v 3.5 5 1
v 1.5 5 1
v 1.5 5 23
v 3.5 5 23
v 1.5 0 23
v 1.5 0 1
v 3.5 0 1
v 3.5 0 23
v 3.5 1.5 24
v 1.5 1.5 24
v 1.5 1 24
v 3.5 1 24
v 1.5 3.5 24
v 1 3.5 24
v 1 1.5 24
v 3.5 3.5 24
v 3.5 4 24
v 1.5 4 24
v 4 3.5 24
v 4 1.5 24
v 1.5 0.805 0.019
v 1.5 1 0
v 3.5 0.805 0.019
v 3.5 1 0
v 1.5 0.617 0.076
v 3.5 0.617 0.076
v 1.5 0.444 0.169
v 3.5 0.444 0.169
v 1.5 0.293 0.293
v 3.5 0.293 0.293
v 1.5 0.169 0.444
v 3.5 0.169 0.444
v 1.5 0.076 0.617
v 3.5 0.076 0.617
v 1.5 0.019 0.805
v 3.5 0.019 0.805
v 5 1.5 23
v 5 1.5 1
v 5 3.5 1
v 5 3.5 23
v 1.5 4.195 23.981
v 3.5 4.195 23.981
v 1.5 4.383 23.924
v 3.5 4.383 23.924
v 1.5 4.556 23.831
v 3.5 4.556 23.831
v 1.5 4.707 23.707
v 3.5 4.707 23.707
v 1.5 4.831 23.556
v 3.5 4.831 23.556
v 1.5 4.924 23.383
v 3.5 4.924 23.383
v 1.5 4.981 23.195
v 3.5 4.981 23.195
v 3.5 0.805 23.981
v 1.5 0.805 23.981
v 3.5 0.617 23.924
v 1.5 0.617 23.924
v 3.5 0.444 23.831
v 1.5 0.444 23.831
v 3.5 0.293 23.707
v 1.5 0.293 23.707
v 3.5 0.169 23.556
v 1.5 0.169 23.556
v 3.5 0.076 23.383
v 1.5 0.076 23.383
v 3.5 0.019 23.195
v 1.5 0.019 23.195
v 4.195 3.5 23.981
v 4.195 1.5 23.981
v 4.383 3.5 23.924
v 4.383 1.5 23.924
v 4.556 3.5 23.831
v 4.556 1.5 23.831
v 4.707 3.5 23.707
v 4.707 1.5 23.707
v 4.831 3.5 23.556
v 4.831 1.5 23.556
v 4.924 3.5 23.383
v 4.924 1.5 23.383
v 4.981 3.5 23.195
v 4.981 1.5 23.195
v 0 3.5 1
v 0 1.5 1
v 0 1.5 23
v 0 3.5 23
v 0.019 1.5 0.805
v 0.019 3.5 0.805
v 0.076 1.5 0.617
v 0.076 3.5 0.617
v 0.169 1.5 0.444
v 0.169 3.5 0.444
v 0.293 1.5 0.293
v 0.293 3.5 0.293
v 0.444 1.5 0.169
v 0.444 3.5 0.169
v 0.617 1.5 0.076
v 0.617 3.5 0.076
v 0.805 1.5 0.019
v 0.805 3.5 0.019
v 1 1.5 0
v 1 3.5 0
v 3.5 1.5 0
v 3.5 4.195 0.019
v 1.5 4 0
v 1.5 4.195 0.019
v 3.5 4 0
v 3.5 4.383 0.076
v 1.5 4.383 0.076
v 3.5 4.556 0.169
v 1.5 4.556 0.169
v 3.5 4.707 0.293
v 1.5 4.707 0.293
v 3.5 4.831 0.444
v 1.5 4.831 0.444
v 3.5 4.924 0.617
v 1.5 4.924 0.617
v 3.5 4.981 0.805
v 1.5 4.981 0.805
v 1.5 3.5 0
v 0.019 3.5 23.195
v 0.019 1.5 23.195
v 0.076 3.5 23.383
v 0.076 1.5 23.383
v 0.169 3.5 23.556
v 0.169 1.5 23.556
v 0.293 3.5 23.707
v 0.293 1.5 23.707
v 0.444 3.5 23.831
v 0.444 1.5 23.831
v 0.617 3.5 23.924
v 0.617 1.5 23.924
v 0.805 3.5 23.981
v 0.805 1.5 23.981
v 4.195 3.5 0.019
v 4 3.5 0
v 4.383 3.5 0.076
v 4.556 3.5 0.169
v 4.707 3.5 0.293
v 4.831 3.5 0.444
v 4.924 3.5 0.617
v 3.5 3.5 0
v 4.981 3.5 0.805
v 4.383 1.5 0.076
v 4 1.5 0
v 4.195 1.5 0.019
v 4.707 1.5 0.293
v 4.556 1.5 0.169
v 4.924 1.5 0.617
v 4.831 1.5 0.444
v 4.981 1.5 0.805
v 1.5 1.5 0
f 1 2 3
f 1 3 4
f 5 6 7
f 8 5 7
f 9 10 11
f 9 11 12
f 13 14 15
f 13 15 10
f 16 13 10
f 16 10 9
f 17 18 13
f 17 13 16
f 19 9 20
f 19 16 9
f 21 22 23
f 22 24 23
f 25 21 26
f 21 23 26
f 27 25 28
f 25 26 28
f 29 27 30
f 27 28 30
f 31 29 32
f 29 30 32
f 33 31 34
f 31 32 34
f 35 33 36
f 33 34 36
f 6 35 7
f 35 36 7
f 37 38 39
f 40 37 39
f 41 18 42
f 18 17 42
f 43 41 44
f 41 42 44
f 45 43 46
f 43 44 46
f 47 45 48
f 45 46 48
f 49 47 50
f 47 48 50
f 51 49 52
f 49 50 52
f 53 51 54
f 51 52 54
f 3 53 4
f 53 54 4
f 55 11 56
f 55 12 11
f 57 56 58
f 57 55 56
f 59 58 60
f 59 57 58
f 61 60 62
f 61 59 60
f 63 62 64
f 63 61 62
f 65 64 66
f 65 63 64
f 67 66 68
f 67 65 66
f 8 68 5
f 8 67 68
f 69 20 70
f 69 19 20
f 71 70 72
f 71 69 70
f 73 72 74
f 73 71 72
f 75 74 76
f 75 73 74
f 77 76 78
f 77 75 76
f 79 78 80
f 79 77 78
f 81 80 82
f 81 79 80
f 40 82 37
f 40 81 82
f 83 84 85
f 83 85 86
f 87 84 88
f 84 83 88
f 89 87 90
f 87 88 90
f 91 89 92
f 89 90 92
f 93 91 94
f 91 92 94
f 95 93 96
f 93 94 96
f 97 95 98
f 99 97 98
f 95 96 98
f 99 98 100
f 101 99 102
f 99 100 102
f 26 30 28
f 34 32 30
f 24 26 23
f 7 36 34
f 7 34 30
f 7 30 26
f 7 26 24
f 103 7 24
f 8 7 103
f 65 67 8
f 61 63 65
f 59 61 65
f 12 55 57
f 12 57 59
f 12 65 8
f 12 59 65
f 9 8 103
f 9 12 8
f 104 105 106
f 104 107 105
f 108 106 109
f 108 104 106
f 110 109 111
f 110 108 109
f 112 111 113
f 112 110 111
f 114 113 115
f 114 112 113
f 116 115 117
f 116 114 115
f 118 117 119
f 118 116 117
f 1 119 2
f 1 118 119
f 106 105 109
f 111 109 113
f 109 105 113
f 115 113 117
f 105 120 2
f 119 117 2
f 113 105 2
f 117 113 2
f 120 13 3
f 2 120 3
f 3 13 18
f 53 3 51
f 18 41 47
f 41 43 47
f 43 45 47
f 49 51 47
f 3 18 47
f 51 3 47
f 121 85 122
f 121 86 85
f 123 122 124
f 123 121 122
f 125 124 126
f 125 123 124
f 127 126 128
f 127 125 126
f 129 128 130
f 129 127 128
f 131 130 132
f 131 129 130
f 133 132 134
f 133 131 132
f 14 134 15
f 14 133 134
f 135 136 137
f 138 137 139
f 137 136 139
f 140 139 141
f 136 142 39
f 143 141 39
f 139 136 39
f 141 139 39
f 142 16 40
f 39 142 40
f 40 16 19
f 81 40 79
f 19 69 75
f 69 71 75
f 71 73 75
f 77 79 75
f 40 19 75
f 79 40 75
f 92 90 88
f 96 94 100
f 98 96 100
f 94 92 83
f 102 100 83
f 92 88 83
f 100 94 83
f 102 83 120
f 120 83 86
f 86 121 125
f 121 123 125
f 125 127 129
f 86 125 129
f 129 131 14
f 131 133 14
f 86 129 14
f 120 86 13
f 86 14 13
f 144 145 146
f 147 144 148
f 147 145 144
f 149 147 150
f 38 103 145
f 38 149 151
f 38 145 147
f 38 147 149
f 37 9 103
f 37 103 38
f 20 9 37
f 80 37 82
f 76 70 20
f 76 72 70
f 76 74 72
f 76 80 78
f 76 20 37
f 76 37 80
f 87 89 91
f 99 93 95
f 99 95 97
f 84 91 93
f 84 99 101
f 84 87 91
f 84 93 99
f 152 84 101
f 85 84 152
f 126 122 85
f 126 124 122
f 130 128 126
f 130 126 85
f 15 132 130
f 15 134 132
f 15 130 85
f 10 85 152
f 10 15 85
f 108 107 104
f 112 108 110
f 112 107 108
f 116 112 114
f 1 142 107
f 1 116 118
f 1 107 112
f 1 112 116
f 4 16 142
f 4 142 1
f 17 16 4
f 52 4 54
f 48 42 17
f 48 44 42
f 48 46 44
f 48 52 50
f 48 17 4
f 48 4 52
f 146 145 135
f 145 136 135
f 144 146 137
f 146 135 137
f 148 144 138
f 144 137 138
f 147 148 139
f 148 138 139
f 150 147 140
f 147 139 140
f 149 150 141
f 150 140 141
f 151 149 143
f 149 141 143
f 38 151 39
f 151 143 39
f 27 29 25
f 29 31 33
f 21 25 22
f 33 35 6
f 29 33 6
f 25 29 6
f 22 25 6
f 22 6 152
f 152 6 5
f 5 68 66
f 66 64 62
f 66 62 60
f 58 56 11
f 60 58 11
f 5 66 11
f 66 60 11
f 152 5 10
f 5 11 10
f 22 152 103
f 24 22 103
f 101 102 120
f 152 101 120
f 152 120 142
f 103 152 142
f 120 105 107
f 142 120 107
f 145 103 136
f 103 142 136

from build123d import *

# Parameters (mm, degrees)
SKETCH1_W           = 5
SKETCH1_H           = 5
BOSS_EXTRUDE1_DEPTH = 24
SKETCH2_W           = 1.5
SKETCH2_H           = 1.5
CUT_EXTRUDE1_DEPTH  = 26.019992006
FILLET1_R           = 1
FILLET2_R           = 1


with BuildPart() as part:
    # Sketch1 → Boss-Extrude1 (new body)
    with BuildSketch(Plane.XY):
        with Locations((2.5, 2.5)):
            Rectangle(SKETCH1_W, SKETCH1_H)
    extrude(amount=BOSS_EXTRUDE1_DEPTH)

    # Sketch2 → Cut-Extrude1 (cut, through all)
    with BuildSketch(Plane.XY.offset(24)):
        with Locations((0.75, 4.25)):
            Rectangle(SKETCH2_W, SKETCH2_H)
        with Locations((4.25, 4.25)):
            Rectangle(SKETCH2_W, SKETCH2_H)
        with Locations((4.25, 0.75)):
            Rectangle(SKETCH2_W, SKETCH2_H)
        with Locations((0.75, 0.75)):
            Rectangle(SKETCH2_W, SKETCH2_H)
    extrude(amount=-CUT_EXTRUDE1_DEPTH, mode=Mode.SUBTRACT)

    # Fillet1
    fillet1_edges = [part.edges().sort_by_distance(p)[0] for p in [
        (0, 2.5, 24),
        (2.5, 5, 24),
        (5, 2.5, 24),
        (2.5, 0, 24),
    ]]
    fillet(fillet1_edges, radius=FILLET1_R)

    # Fillet2
    fillet2_edges = [part.edges().sort_by_distance(p)[0] for p in [
        (0, 2.5, 0),
        (2.5, 5, 0),
        (5, 2.5, 0),
        (2.5, 0, 0),
    ]]
    fillet(fillet2_edges, radius=FILLET2_R)


solid = part.part
